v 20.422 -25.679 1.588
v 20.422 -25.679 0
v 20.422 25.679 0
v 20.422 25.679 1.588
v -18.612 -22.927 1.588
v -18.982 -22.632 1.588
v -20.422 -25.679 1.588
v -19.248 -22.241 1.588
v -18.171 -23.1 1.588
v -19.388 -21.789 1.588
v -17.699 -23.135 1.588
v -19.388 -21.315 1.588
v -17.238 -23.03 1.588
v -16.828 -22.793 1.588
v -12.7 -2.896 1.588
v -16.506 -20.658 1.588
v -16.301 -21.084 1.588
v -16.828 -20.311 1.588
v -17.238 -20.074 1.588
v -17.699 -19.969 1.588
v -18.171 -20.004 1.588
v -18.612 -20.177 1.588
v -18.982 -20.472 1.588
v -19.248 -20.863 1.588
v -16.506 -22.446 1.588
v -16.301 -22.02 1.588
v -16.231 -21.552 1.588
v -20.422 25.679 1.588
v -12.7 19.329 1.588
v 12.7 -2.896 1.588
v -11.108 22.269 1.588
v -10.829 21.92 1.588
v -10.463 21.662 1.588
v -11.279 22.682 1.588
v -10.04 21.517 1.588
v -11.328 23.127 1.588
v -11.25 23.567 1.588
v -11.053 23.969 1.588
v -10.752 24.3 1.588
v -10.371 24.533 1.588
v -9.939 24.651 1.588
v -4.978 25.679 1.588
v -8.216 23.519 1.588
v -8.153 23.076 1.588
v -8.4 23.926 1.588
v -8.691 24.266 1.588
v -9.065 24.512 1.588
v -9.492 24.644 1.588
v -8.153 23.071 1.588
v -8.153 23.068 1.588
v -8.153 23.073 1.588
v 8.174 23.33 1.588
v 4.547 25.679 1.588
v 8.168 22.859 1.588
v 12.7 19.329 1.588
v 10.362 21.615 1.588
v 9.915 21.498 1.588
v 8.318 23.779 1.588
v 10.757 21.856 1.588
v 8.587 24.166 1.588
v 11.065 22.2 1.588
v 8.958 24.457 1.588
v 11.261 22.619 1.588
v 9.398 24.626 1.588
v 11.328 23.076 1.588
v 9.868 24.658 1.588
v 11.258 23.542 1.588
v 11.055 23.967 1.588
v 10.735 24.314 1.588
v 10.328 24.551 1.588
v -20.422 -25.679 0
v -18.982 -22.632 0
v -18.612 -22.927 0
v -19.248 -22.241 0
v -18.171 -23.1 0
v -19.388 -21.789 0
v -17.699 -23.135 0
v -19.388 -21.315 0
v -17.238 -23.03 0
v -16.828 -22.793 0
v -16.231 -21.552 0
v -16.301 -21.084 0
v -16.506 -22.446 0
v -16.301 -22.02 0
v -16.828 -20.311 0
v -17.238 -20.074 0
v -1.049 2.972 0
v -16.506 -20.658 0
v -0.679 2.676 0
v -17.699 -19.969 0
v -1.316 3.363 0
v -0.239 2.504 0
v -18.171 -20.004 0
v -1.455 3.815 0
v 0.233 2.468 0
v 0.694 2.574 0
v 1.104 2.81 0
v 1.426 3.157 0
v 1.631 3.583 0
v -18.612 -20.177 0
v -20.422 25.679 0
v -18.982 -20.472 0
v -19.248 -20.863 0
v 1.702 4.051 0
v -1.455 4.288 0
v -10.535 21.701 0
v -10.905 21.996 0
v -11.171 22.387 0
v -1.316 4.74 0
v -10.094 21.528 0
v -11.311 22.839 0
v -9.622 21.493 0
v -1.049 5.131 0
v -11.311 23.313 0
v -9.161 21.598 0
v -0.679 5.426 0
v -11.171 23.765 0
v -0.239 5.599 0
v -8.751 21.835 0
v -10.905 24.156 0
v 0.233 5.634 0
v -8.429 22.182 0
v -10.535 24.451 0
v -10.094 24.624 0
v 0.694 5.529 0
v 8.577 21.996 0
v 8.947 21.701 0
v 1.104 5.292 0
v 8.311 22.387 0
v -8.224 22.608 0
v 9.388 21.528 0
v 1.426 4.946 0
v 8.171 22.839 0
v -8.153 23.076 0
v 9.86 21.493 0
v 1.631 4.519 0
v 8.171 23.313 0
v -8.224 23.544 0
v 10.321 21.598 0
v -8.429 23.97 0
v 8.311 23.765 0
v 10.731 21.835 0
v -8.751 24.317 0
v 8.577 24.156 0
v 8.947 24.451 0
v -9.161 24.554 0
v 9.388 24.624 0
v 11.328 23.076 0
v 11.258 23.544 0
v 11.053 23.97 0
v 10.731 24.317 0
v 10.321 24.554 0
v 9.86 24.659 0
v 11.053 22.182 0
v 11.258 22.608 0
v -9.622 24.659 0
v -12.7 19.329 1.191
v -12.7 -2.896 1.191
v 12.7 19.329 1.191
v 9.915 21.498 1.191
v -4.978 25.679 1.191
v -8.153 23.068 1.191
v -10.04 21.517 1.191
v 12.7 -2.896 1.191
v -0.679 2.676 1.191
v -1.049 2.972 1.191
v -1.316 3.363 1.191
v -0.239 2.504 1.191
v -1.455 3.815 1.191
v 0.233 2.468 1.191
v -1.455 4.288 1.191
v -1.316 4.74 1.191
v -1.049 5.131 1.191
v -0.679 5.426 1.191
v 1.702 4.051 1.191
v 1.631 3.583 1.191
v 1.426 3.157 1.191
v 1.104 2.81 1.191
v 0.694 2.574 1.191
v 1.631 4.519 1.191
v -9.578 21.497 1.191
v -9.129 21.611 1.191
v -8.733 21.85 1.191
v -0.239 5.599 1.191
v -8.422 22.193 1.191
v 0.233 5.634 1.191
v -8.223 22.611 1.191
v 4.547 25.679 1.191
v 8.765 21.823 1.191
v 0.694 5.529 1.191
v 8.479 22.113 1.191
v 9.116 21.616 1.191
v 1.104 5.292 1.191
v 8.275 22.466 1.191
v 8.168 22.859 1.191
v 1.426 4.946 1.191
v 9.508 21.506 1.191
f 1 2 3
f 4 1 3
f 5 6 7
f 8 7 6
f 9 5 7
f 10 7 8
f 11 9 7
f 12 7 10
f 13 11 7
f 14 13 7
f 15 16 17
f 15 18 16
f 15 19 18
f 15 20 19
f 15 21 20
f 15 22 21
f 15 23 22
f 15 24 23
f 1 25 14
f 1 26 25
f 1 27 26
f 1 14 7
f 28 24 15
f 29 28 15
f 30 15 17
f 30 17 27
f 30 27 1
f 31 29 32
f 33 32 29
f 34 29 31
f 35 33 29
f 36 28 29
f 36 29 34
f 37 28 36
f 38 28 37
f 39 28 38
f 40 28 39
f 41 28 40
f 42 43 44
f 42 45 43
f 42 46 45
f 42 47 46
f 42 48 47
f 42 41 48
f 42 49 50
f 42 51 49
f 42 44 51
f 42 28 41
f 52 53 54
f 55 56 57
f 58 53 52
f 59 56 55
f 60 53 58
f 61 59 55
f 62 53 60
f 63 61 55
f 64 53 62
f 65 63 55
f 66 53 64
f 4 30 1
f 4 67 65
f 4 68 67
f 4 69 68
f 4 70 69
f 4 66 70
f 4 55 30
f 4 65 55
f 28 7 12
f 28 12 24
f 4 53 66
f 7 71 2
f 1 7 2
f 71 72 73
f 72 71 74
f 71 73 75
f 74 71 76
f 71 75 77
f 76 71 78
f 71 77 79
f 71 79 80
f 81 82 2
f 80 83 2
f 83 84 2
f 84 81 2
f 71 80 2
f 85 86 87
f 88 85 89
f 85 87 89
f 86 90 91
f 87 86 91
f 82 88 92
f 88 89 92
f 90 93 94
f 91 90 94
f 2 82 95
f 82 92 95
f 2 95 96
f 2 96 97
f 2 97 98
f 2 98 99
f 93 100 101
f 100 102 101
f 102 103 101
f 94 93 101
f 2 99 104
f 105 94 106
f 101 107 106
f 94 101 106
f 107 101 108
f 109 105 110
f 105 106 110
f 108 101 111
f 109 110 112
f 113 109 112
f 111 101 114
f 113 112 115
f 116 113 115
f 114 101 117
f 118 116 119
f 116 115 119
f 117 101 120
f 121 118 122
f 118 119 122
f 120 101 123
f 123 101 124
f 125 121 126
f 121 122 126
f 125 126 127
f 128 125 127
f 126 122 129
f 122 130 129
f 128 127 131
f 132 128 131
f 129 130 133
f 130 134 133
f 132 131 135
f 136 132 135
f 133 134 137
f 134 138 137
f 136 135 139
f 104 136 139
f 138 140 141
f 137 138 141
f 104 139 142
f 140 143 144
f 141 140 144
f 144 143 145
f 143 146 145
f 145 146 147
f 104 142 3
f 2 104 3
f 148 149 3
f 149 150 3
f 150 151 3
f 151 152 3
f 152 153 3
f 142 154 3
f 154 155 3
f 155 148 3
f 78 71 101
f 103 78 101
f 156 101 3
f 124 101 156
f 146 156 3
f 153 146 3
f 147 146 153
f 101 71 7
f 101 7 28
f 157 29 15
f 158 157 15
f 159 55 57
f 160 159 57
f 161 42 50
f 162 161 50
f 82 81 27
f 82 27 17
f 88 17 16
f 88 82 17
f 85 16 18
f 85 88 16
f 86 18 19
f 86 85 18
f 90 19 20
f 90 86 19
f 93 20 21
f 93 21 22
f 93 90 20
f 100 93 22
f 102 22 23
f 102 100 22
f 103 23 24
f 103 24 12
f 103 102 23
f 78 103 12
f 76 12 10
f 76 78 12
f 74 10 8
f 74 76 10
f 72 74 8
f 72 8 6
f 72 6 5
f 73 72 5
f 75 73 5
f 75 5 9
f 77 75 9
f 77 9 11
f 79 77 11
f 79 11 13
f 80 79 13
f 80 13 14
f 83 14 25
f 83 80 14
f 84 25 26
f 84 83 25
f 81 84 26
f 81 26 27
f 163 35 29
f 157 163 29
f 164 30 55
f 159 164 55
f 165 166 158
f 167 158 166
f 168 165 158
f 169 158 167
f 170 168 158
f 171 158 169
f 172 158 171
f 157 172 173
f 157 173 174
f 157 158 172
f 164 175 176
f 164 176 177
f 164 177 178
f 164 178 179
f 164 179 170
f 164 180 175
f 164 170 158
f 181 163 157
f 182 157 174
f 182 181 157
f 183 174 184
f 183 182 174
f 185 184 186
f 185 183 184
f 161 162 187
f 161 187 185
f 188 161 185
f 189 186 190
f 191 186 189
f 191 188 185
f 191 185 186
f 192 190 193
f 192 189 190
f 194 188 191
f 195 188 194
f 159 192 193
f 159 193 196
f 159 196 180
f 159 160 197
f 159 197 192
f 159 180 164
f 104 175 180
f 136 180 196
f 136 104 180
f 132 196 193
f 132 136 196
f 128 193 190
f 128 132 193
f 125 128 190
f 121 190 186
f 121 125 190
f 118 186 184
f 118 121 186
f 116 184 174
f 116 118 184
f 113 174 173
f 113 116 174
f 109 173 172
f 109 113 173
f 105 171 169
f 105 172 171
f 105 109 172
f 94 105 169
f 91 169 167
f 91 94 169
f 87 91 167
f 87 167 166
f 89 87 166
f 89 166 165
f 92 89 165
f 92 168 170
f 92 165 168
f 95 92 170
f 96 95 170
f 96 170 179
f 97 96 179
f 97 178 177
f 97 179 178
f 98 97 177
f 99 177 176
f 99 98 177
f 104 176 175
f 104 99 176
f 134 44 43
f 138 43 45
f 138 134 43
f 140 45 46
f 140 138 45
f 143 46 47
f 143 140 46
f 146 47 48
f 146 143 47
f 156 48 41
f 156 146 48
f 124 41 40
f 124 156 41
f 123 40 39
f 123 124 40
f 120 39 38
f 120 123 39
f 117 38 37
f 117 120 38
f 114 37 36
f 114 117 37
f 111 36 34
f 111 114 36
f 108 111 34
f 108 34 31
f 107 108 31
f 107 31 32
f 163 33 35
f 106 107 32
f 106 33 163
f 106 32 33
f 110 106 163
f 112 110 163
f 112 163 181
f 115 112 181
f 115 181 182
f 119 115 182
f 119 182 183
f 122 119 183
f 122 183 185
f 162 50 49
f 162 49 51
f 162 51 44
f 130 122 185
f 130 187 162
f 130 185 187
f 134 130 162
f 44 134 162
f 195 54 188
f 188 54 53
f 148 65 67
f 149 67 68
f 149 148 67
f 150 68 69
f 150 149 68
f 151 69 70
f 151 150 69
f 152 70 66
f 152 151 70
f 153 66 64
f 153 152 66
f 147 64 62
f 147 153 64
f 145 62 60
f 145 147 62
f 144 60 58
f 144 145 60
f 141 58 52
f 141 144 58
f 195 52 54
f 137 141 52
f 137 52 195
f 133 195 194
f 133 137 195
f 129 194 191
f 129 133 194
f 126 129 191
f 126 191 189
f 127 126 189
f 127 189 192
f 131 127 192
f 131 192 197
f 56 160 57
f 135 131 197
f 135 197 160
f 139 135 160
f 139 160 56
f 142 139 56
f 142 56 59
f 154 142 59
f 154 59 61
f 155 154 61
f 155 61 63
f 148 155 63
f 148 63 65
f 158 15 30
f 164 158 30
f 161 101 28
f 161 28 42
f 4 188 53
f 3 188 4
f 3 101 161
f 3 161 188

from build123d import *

# Parameters (mm, degrees)
F0_W     = 40.8432
F0_H     = 51.3588
F0_R     = 1.5875
F1_DEPTH = 1.5875
F3_DEPTH = 0.396875


with BuildPart() as f1:
    # F0 (on Top) → F1 (new body)
    with BuildSketch(Plane.XY):
        Rectangle(F0_W, F0_H)
        with Locations((-17.8181, -21.5519)):
            Circle(F0_R, mode=Mode.SUBTRACT)
        with Locations((-9.7409, 23.0759)):
            Circle(F0_R, mode=Mode.SUBTRACT)
        with Locations((0.1143, 4.0513)):
            Circle(F0_R, mode=Mode.SUBTRACT)
        with Locations((9.7409, 23.0759)):
            Circle(F0_R, mode=Mode.SUBTRACT)
    extrude(amount=F1_DEPTH)

    # F2 (on face) → F3 (cut)
    with BuildSketch(Plane.XY.offset(1.5875)):
        Polygon((4.5466, 25.6794), (-4.9784, 25.6794), (-12.7, 19.3294), (-12.7, -2.8956), (12.7, -2.8956), (12.7, 19.3294), align=None)
    extrude(amount=-F3_DEPTH, mode=Mode.SUBTRACT)


solid = f1.part
